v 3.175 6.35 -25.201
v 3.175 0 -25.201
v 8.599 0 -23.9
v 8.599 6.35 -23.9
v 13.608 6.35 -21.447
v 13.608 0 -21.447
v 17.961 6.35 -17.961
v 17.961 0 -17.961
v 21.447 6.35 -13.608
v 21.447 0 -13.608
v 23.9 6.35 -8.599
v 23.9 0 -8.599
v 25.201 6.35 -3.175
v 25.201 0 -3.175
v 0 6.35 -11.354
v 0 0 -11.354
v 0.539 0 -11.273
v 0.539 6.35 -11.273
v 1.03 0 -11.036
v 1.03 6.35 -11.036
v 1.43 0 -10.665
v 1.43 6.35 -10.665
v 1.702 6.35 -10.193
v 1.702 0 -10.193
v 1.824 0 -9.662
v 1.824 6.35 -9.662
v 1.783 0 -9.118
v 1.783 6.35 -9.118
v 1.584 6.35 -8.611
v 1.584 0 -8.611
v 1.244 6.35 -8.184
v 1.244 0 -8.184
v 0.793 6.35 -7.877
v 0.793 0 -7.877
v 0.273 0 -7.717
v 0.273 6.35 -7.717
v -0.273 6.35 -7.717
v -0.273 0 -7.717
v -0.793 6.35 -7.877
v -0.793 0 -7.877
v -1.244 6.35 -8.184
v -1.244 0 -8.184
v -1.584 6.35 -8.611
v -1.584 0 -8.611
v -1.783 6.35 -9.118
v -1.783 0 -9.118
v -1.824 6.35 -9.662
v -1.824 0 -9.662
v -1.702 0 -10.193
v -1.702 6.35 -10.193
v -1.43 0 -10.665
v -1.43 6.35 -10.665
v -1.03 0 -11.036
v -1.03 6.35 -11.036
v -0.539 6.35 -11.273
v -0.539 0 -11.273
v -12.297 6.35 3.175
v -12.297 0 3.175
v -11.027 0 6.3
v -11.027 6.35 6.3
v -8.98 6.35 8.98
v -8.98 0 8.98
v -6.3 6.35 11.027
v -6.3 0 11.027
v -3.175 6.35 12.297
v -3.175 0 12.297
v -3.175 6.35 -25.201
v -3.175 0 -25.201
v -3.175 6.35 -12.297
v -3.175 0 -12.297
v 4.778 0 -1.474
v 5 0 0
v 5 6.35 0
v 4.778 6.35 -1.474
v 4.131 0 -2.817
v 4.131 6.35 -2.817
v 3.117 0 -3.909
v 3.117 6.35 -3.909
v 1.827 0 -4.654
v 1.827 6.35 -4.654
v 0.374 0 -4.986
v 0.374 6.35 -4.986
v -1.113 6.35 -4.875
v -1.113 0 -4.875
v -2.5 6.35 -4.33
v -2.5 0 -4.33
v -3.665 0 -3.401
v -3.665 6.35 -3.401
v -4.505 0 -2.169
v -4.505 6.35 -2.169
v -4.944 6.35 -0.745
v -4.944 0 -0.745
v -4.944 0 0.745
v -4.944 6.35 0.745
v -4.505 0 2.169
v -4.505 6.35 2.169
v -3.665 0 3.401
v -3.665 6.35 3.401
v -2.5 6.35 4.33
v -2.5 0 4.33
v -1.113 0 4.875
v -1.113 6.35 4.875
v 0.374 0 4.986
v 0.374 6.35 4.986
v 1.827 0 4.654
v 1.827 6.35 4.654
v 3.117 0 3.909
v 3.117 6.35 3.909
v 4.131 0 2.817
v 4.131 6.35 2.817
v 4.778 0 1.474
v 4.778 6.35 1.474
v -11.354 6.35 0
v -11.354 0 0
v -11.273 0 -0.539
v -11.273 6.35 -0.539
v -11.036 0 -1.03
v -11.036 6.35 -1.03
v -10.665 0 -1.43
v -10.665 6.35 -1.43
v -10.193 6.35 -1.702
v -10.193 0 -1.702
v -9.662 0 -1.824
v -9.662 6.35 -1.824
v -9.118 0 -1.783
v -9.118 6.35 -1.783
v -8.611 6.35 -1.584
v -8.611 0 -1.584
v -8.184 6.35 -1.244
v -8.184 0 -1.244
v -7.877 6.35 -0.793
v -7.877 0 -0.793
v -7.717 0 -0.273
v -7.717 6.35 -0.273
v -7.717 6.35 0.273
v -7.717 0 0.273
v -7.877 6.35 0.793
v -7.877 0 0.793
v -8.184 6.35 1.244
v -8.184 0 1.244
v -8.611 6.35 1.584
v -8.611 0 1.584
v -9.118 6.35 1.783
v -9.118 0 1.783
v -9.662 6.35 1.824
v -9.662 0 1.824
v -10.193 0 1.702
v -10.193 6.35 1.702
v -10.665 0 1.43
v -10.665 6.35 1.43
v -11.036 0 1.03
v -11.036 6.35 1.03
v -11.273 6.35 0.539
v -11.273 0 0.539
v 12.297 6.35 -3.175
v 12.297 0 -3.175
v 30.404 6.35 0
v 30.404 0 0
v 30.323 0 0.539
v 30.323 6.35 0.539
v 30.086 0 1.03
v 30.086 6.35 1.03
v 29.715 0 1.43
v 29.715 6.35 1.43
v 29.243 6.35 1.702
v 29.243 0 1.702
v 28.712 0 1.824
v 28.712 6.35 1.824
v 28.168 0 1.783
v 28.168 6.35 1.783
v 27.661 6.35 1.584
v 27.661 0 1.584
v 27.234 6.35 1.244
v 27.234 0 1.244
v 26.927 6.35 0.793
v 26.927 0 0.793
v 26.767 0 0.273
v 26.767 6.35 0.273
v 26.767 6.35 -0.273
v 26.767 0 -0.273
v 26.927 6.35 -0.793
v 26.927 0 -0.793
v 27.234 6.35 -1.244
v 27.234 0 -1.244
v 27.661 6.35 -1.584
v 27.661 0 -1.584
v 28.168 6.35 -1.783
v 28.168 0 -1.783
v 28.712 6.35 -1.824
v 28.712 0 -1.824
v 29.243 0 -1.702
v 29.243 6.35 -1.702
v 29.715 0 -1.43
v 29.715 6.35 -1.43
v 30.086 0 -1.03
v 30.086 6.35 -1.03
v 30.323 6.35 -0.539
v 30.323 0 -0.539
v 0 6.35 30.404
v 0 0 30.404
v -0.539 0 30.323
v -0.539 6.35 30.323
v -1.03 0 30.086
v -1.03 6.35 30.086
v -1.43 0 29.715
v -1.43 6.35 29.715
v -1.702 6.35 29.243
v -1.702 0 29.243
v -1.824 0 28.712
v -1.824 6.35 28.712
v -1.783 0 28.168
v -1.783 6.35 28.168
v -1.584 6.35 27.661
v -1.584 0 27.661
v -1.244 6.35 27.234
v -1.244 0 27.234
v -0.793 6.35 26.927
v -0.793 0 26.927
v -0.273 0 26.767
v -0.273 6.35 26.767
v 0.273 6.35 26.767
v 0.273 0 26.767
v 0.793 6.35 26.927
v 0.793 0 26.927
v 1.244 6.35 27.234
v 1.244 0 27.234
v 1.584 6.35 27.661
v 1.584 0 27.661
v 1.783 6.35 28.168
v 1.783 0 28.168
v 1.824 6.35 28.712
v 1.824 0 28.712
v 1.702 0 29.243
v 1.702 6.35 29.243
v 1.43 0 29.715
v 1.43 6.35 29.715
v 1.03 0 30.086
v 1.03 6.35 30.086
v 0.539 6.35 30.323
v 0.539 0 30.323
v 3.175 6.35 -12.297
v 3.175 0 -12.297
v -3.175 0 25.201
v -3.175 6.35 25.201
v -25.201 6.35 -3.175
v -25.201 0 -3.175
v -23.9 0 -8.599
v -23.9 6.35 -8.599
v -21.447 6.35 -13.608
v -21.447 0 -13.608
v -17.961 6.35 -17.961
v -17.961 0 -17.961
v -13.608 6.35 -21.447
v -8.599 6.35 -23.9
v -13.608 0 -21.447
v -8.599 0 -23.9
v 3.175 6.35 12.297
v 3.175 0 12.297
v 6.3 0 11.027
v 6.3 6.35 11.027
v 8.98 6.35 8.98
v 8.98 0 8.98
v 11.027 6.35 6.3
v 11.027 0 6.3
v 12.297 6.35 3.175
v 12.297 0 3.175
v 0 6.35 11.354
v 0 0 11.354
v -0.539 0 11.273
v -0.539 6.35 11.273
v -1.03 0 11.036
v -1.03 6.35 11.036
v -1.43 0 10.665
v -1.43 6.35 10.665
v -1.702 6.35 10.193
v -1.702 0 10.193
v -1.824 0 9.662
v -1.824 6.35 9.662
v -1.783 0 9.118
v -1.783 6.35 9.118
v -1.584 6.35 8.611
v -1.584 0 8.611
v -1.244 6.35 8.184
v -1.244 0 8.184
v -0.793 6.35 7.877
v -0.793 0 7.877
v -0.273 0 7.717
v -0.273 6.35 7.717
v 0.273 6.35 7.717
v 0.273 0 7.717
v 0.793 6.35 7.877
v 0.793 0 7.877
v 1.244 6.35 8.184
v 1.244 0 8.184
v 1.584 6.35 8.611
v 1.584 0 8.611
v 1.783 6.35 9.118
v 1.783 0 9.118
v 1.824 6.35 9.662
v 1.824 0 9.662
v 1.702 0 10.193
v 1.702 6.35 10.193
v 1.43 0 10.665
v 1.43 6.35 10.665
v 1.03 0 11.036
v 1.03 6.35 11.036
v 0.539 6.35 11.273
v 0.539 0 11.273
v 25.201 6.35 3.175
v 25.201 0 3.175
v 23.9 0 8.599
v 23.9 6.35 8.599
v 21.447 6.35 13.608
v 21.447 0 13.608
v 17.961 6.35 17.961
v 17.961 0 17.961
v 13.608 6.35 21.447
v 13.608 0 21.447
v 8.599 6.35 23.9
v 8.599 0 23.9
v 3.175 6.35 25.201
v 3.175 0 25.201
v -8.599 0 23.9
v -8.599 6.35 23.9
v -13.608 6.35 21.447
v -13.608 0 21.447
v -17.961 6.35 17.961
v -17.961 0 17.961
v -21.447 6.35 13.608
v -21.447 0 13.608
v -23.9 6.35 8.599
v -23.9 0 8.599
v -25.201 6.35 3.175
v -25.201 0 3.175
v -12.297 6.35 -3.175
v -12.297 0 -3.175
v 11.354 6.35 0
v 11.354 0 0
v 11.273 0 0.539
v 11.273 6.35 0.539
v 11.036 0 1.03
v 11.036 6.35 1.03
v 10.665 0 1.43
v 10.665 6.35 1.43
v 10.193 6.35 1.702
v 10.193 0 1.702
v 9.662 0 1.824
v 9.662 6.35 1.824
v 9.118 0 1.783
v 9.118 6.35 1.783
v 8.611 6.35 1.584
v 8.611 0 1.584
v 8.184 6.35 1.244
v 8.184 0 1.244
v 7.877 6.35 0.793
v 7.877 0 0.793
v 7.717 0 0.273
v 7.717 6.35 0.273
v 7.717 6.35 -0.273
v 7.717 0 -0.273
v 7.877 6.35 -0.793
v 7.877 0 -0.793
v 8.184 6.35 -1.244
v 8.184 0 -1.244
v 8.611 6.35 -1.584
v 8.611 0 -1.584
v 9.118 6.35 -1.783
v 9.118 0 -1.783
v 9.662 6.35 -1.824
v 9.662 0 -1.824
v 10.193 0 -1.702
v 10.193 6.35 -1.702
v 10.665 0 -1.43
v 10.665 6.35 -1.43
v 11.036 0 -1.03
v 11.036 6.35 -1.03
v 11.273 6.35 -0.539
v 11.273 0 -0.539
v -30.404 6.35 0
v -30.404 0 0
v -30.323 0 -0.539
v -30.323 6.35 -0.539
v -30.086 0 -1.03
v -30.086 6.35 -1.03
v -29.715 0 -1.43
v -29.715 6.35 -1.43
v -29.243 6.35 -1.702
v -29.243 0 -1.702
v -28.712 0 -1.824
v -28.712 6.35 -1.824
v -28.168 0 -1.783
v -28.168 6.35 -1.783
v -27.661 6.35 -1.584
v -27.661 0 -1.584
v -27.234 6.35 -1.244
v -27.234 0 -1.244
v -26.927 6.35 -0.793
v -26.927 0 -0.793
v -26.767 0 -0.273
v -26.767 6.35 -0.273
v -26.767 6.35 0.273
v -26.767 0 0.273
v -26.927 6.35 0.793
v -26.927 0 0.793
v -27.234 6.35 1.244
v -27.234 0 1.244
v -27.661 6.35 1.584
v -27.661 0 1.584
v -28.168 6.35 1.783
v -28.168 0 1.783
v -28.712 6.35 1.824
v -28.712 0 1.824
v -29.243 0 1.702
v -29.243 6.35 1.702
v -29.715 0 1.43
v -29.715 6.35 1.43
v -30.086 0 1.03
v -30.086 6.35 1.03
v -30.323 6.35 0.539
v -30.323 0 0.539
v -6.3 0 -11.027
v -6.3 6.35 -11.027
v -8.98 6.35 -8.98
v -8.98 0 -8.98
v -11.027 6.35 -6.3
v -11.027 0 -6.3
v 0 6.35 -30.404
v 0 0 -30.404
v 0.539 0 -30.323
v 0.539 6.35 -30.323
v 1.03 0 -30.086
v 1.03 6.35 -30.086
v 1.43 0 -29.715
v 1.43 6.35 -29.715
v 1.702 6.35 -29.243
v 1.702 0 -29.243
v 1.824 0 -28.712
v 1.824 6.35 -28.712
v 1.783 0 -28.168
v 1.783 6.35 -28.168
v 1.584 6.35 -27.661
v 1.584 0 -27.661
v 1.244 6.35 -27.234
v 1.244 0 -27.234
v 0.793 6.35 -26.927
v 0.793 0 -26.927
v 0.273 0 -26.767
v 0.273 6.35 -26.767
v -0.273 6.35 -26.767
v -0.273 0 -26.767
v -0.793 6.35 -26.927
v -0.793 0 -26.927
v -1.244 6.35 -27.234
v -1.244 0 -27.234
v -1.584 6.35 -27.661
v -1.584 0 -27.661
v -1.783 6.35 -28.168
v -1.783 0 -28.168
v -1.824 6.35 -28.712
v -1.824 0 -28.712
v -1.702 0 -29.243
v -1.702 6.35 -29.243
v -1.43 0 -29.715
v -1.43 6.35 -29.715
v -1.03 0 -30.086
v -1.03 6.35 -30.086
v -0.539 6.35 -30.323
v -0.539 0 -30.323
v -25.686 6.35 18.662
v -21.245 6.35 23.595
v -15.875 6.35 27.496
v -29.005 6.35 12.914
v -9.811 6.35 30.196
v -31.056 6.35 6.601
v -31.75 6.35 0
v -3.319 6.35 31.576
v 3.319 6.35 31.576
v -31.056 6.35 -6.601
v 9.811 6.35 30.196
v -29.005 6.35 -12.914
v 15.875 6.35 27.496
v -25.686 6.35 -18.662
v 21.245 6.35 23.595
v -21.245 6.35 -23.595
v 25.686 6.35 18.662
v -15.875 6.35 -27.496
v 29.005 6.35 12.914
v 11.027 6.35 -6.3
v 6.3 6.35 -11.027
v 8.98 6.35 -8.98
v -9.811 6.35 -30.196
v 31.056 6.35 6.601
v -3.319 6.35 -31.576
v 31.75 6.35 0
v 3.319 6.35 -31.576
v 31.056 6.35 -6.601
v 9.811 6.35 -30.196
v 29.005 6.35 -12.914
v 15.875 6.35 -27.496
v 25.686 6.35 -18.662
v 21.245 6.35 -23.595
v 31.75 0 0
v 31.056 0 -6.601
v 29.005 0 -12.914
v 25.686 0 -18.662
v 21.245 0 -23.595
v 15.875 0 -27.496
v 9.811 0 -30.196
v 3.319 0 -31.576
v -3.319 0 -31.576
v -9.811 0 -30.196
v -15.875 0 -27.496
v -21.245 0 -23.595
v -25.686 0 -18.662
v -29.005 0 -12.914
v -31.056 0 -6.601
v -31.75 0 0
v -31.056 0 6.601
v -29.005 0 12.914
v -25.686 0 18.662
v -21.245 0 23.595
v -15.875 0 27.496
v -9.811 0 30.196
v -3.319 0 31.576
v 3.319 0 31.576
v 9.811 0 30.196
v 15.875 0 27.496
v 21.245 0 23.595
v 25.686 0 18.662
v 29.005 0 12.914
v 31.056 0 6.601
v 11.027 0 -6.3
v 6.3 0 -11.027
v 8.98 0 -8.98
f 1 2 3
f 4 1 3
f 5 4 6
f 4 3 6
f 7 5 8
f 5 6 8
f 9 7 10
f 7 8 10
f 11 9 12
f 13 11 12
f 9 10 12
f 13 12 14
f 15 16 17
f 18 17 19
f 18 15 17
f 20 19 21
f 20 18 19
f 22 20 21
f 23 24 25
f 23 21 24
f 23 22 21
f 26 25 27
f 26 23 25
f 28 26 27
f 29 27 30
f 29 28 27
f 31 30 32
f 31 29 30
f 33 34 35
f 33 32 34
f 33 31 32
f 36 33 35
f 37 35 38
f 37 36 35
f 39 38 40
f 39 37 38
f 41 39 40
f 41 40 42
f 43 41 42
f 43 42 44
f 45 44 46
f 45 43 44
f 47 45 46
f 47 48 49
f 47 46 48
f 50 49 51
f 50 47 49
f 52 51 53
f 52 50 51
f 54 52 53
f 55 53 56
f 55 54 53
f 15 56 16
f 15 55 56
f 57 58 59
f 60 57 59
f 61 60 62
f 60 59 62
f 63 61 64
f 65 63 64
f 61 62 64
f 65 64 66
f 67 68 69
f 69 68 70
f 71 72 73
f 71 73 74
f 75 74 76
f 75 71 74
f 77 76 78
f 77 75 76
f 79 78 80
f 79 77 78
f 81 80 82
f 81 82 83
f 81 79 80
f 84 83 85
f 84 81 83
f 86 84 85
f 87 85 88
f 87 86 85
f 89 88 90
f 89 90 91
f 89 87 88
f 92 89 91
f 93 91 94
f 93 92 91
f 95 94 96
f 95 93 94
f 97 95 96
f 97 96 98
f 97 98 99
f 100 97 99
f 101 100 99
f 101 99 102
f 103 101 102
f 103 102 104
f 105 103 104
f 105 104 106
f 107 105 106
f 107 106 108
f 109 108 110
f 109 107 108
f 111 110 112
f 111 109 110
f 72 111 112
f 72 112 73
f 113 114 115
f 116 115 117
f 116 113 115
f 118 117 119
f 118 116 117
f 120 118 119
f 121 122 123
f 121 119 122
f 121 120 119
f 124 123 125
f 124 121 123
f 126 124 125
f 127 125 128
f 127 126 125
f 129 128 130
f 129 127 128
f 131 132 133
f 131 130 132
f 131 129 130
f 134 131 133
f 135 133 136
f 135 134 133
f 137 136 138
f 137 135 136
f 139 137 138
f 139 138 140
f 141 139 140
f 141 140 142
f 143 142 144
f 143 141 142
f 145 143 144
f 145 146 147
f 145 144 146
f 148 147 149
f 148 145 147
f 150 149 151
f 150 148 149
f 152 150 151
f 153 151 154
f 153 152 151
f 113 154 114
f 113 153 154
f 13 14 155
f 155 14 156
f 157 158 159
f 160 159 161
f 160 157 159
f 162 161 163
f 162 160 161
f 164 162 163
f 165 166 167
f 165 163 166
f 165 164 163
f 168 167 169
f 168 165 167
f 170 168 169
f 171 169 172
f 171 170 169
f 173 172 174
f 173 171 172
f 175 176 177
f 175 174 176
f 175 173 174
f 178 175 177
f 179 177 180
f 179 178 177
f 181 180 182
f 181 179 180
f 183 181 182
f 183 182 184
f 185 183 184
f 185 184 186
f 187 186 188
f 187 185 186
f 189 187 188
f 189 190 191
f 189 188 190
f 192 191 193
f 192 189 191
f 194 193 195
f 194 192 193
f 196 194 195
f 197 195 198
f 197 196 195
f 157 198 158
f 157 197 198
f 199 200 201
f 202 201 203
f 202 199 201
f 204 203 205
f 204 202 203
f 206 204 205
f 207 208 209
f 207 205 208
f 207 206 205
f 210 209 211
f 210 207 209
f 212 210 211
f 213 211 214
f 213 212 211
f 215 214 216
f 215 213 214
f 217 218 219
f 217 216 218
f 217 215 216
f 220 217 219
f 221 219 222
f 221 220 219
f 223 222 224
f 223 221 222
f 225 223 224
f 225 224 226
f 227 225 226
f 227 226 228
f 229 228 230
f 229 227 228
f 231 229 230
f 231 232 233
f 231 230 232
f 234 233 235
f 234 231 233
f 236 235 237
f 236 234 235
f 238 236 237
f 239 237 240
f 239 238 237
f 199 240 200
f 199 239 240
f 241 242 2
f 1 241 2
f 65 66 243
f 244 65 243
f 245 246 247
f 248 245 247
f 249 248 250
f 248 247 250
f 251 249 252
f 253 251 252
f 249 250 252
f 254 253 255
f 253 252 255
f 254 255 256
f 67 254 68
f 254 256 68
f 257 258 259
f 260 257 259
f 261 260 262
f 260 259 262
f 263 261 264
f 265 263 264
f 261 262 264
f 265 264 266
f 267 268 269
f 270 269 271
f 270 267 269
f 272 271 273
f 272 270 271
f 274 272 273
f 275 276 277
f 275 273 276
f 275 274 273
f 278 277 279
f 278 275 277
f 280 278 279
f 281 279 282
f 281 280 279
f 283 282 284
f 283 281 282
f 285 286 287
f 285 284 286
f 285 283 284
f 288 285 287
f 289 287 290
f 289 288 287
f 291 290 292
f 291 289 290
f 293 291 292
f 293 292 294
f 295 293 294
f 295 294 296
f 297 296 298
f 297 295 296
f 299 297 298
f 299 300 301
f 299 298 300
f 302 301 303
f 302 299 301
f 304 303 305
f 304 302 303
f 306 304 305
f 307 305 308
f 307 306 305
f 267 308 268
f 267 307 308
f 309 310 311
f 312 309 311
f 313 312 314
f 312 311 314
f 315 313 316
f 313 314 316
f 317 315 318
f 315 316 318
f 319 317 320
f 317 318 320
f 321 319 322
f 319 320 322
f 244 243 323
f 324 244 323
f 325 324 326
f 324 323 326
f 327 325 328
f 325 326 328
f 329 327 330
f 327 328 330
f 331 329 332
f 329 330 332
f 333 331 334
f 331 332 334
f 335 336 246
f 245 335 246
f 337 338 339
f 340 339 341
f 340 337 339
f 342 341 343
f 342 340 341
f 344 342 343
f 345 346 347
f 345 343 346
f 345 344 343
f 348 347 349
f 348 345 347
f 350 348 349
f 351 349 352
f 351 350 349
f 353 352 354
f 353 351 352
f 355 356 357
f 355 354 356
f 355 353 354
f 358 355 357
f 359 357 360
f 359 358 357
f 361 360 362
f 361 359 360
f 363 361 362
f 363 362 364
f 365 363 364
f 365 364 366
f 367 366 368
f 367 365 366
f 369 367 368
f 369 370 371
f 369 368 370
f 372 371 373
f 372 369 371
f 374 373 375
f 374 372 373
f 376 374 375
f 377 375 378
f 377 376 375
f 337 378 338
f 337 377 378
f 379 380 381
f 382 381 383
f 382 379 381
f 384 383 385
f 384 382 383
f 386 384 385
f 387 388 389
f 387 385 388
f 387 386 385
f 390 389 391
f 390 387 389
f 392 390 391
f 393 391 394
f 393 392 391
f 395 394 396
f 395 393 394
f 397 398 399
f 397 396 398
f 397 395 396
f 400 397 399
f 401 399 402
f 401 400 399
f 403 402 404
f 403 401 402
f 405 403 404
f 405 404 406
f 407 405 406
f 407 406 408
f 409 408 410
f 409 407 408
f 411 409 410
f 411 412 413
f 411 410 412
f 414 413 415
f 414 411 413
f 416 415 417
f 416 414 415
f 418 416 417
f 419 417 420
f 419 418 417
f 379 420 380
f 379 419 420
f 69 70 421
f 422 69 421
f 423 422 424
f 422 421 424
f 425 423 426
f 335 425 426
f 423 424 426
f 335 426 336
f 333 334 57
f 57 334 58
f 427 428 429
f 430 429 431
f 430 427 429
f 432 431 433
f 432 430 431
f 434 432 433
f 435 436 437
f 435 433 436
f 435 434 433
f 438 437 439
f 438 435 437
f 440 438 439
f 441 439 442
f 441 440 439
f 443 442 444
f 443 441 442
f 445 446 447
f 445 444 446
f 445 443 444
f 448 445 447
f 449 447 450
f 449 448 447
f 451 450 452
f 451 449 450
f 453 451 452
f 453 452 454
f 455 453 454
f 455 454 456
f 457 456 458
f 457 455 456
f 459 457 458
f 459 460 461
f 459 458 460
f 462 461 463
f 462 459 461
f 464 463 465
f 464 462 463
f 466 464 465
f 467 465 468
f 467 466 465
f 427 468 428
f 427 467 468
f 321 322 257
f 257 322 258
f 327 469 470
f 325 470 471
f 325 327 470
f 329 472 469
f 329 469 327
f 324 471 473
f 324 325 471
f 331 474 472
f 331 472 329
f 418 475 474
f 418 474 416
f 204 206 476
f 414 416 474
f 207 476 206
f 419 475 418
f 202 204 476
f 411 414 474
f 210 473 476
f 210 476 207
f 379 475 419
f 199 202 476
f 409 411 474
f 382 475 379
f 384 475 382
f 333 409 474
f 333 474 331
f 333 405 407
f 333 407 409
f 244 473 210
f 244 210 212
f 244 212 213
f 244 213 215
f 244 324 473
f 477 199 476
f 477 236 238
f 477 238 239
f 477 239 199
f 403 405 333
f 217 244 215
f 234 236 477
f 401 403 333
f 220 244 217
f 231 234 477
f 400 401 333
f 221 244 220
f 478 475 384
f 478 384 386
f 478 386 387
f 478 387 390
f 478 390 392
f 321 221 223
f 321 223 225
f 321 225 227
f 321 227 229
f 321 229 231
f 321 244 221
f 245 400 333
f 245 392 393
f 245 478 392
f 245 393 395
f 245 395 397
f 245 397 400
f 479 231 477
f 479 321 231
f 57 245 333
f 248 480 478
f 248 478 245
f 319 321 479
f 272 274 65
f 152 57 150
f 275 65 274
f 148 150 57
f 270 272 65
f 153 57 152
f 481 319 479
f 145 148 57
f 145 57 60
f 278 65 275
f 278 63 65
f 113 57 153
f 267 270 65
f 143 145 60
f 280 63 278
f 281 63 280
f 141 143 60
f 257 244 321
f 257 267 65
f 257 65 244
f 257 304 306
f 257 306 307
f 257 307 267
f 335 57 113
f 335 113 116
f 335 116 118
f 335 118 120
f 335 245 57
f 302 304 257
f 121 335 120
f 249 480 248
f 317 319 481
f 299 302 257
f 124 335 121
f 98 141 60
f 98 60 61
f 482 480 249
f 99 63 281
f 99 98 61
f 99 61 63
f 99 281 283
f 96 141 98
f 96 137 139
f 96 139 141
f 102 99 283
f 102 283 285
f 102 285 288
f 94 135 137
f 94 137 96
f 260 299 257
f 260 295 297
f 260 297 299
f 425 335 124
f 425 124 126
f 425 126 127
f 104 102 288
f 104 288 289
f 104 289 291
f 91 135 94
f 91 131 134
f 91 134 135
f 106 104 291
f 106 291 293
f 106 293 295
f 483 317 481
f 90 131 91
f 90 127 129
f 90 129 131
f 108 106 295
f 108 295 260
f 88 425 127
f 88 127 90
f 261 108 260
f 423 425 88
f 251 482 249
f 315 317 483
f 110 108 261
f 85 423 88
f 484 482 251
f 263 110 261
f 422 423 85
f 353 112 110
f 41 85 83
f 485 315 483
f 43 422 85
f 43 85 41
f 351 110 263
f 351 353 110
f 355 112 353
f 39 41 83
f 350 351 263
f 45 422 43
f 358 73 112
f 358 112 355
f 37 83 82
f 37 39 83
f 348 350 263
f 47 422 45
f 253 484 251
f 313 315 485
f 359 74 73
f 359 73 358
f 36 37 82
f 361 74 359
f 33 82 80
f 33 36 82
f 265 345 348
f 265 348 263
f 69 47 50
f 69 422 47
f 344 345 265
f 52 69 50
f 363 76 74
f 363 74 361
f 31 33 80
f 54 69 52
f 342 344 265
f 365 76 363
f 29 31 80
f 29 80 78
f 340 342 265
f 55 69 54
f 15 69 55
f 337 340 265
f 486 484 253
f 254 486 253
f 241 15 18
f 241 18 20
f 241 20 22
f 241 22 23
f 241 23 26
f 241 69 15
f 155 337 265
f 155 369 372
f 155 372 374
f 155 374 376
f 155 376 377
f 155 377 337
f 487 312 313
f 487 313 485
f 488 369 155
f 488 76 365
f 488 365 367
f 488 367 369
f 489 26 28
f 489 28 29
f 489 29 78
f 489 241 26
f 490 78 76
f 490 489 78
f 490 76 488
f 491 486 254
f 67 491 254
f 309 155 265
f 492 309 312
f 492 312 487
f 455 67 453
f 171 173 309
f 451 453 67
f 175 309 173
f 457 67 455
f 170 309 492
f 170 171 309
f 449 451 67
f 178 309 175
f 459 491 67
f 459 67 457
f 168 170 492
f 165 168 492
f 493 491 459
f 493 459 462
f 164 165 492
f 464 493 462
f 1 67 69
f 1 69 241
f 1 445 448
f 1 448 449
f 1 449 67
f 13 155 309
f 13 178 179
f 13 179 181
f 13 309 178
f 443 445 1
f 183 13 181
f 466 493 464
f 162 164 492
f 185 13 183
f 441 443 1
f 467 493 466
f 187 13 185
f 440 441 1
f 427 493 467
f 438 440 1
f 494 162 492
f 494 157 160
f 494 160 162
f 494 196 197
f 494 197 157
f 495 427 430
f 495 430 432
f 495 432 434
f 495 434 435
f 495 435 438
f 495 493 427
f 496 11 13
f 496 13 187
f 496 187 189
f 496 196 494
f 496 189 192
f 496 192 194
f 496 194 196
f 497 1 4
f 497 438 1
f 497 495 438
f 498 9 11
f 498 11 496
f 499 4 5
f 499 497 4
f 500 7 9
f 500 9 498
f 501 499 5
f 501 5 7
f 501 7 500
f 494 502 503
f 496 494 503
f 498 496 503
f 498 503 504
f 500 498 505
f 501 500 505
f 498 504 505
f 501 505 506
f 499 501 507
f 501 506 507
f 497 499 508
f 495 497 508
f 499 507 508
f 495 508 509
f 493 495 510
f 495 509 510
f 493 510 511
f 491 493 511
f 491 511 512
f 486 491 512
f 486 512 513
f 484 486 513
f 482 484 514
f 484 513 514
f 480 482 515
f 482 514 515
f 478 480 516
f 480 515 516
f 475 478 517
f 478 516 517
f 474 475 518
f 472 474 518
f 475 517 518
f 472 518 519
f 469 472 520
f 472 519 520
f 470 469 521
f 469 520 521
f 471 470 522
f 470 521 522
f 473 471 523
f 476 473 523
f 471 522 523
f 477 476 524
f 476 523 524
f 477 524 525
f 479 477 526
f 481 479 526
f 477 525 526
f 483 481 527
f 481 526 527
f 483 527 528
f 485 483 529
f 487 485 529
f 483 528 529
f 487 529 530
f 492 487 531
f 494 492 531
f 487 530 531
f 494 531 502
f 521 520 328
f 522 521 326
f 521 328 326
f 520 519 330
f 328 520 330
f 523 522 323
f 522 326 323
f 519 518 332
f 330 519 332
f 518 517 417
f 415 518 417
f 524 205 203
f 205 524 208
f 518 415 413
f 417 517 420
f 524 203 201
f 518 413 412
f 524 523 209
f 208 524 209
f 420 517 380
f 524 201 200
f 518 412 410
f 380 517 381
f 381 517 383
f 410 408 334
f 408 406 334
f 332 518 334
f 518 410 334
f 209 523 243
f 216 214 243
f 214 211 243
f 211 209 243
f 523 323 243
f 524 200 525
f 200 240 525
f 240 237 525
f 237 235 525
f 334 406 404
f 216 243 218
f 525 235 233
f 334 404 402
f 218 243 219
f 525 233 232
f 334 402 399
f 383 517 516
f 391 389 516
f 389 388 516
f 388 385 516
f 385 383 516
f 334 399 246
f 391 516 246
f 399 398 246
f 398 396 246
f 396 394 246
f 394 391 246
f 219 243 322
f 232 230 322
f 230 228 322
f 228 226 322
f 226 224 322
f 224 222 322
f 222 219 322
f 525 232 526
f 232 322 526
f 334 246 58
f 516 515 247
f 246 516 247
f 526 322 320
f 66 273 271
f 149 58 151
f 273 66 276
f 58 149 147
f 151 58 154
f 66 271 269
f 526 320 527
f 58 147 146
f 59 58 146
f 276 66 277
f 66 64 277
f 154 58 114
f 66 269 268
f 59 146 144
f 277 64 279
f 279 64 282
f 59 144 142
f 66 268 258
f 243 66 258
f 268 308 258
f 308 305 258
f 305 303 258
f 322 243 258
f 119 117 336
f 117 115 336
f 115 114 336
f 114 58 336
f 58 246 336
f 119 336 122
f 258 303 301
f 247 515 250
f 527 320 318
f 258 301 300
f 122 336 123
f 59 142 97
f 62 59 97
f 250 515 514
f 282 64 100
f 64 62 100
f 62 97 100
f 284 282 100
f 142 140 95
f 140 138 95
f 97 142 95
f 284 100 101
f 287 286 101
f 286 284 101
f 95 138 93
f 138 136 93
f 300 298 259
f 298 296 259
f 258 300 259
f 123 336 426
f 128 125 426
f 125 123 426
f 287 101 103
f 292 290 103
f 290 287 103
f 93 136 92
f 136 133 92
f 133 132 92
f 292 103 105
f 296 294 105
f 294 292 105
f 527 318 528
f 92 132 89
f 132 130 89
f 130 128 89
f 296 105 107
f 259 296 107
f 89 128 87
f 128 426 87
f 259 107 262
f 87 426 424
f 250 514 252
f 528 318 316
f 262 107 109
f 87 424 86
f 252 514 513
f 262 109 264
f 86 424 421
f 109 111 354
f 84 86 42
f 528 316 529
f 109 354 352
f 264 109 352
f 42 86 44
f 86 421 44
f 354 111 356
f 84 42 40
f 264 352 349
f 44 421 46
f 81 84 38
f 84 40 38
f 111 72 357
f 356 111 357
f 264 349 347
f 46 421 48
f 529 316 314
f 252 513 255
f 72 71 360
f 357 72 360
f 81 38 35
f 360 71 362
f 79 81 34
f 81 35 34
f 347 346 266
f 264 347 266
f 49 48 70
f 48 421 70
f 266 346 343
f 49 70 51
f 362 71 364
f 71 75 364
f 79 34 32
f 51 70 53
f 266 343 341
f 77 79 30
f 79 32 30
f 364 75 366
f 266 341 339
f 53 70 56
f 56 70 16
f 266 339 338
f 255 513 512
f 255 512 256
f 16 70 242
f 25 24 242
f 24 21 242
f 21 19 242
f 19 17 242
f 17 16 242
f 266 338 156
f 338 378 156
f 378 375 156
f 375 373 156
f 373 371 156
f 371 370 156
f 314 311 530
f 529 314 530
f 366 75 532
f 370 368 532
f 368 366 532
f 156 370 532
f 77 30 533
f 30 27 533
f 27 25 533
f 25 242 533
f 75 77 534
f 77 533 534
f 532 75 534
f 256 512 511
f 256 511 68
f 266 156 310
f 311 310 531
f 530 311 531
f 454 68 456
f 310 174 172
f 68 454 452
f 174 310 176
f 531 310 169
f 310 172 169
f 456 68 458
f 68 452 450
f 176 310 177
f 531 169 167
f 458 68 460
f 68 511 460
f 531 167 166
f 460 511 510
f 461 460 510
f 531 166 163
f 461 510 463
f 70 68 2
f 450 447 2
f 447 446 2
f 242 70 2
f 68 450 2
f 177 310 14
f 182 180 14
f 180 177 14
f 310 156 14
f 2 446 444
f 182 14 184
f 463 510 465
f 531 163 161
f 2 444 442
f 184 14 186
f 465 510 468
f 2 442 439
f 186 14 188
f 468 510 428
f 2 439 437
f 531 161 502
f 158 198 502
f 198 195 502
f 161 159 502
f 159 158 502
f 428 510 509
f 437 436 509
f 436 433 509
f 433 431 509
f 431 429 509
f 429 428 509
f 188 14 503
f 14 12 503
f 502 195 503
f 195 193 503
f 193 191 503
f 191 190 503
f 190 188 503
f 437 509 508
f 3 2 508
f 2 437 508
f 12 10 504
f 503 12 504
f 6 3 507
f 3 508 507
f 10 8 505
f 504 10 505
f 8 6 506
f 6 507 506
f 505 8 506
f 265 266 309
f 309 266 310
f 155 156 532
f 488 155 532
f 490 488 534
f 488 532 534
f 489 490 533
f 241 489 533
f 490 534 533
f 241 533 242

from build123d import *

# Parameters (mm, degrees)
SKETCH1_R                      = 31.75
SKETCH1_R_2                    = 25.4
SKETCH1_R_3                    = 12.7
SKETCH1_R_4                    = 5
BOSS_EXTRUDE1_DEPTH            = 6.35
F_6_CLEARANCE_HOLE1_AT_2_COUNT = 2
F_6_CLEARANCE_HOLE1_AT_2_PITCH = 19.05
CIRPATTERN1_COUNT              = 4


with BuildPart() as part:
    # Sketch1 → Boss-Extrude1 (new body)
    with BuildSketch(Plane(origin=(0, 0, 0), x_dir=(1, 0, 0), z_dir=(0, 1, 0))):
        Circle(SKETCH1_R)
        Circle(SKETCH1_R_2, mode=Mode.SUBTRACT)
        Circle(SKETCH1_R_3)
        Circle(SKETCH1_R_4, mode=Mode.SUBTRACT)
        with BuildLine():
            ThreePointArc((-12.296722124, -3.175), (-12.7, 0), (-12.296722124, 3.175))
            Line((-12.296722124, 3.175), (-25.200781238, 3.175))
            ThreePointArc((-25.200781238, 3.175), (-25.4, 0), (-25.200781238, -3.175))
            Line((-25.200781238, -3.175), (-12.296722124, -3.175))
        make_face()
        with BuildLine():
            Line((-3.175, 25.200781238), (-3.175, 12.296722124))
            ThreePointArc((-3.175, 12.296722124), (0, 12.7), (3.175, 12.296722124))
            Line((3.175, 12.296722124), (3.175, 25.200781238))
            ThreePointArc((3.175, 25.200781238), (0, 25.4), (-3.175, 25.200781238))
        make_face()
        with BuildLine():
            Line((25.200781238, 3.175), (12.296722124, 3.175))
            ThreePointArc((12.296722124, 3.175), (12.598777143, 1.600254515), (12.7, 0))
            ThreePointArc((12.7, 0), (12.598777143, -1.600254515), (12.296722124, -3.175))
            Line((12.296722124, -3.175), (25.200781238, -3.175))
            ThreePointArc((25.200781238, -3.175), (25.350146385, -1.590621979), (25.4, 0))
            ThreePointArc((25.4, 0), (25.350146385, 1.590621979), (25.200781238, 3.175))
        make_face()
        with BuildLine():
            ThreePointArc((3.175, -12.296722124), (0, -12.7), (-3.175, -12.296722124))
            Line((-3.175, -12.296722124), (-3.175, -25.200781238))
            ThreePointArc((-3.175, -25.200781238), (0, -25.4), (3.175, -25.200781238))
            Line((3.175, -25.200781238), (3.175, -12.296722124))
        make_face()
    extrude(amount=BOSS_EXTRUDE1_DEPTH)

    # Sketch2 → #6 Clearance Hole1 (revolve, cut)
    with BuildSketch(Plane(origin=(0, 6.35, 28.575), x_dir=(0, 0, 1), z_dir=(1, 0, 0))):
        Polygon((0, 0), (0, 13.7988539), (1.8288, 12.7), (1.8288, 0), align=None)
    f_6_clearance_hole1 = revolve(axis=Axis((0, 12.7, 28.575), (0, -1, 0)), mode=Mode.SUBTRACT)

    # #6 Clearance Hole1 at 2: #6 Clearance Hole1 ×2
    with Locations(*[(0, 0, -i * F_6_CLEARANCE_HOLE1_AT_2_PITCH) for i in range(1, F_6_CLEARANCE_HOLE1_AT_2_COUNT)]):
        add(f_6_clearance_hole1, mode=Mode.SUBTRACT)

    # CirPattern1: #6 Clearance Hole1 ×4 about axis
    cirpattern1_axis = Axis((0, 0, 0), (0, 1, 0))
    for i in range(1, CIRPATTERN1_COUNT):
        add(f_6_clearance_hole1.rotate(cirpattern1_axis, i * 360 / CIRPATTERN1_COUNT), mode=Mode.SUBTRACT)

    # CirPattern1 copy 1 sketch → CirPattern1 copy 1 (revolve, cut)
    with BuildSketch(Plane(origin=(9.525, 6.35, 0), x_dir=(1, 0, 0), z_dir=(0, 0, -1))):
        Polygon((0, 0), (0, 13.7988539), (1.8288, 12.7), (1.8288, 0), align=None)
    revolve(axis=Axis((9.525, 12.7, 0), (0, -1, 0)), mode=Mode.SUBTRACT)

    # CirPattern1 copy 2 sketch → CirPattern1 copy 2 (revolve, cut)
    with BuildSketch(Plane(origin=(0, 6.35, -9.525), x_dir=(0, 0, -1), z_dir=(-1, 0, 0))):
        Polygon((0, 0), (0, 13.7988539), (1.8288, 12.7), (1.8288, 0), align=None)
    revolve(axis=Axis((0, 12.7, -9.525), (0, -1, 0)), mode=Mode.SUBTRACT)

    # CirPattern1 copy 3 sketch → CirPattern1 copy 3 (revolve, cut)
    with BuildSketch(Plane(origin=(-9.525, 6.35, 0), x_dir=(-1, 0, 0), z_dir=(0, 0, 1))):
        Polygon((0, 0), (0, 13.7988539), (1.8288, 12.7), (1.8288, 0), align=None)
    revolve(axis=Axis((-9.525, 12.7, 0), (0, -1, 0)), mode=Mode.SUBTRACT)


solid = part.part
